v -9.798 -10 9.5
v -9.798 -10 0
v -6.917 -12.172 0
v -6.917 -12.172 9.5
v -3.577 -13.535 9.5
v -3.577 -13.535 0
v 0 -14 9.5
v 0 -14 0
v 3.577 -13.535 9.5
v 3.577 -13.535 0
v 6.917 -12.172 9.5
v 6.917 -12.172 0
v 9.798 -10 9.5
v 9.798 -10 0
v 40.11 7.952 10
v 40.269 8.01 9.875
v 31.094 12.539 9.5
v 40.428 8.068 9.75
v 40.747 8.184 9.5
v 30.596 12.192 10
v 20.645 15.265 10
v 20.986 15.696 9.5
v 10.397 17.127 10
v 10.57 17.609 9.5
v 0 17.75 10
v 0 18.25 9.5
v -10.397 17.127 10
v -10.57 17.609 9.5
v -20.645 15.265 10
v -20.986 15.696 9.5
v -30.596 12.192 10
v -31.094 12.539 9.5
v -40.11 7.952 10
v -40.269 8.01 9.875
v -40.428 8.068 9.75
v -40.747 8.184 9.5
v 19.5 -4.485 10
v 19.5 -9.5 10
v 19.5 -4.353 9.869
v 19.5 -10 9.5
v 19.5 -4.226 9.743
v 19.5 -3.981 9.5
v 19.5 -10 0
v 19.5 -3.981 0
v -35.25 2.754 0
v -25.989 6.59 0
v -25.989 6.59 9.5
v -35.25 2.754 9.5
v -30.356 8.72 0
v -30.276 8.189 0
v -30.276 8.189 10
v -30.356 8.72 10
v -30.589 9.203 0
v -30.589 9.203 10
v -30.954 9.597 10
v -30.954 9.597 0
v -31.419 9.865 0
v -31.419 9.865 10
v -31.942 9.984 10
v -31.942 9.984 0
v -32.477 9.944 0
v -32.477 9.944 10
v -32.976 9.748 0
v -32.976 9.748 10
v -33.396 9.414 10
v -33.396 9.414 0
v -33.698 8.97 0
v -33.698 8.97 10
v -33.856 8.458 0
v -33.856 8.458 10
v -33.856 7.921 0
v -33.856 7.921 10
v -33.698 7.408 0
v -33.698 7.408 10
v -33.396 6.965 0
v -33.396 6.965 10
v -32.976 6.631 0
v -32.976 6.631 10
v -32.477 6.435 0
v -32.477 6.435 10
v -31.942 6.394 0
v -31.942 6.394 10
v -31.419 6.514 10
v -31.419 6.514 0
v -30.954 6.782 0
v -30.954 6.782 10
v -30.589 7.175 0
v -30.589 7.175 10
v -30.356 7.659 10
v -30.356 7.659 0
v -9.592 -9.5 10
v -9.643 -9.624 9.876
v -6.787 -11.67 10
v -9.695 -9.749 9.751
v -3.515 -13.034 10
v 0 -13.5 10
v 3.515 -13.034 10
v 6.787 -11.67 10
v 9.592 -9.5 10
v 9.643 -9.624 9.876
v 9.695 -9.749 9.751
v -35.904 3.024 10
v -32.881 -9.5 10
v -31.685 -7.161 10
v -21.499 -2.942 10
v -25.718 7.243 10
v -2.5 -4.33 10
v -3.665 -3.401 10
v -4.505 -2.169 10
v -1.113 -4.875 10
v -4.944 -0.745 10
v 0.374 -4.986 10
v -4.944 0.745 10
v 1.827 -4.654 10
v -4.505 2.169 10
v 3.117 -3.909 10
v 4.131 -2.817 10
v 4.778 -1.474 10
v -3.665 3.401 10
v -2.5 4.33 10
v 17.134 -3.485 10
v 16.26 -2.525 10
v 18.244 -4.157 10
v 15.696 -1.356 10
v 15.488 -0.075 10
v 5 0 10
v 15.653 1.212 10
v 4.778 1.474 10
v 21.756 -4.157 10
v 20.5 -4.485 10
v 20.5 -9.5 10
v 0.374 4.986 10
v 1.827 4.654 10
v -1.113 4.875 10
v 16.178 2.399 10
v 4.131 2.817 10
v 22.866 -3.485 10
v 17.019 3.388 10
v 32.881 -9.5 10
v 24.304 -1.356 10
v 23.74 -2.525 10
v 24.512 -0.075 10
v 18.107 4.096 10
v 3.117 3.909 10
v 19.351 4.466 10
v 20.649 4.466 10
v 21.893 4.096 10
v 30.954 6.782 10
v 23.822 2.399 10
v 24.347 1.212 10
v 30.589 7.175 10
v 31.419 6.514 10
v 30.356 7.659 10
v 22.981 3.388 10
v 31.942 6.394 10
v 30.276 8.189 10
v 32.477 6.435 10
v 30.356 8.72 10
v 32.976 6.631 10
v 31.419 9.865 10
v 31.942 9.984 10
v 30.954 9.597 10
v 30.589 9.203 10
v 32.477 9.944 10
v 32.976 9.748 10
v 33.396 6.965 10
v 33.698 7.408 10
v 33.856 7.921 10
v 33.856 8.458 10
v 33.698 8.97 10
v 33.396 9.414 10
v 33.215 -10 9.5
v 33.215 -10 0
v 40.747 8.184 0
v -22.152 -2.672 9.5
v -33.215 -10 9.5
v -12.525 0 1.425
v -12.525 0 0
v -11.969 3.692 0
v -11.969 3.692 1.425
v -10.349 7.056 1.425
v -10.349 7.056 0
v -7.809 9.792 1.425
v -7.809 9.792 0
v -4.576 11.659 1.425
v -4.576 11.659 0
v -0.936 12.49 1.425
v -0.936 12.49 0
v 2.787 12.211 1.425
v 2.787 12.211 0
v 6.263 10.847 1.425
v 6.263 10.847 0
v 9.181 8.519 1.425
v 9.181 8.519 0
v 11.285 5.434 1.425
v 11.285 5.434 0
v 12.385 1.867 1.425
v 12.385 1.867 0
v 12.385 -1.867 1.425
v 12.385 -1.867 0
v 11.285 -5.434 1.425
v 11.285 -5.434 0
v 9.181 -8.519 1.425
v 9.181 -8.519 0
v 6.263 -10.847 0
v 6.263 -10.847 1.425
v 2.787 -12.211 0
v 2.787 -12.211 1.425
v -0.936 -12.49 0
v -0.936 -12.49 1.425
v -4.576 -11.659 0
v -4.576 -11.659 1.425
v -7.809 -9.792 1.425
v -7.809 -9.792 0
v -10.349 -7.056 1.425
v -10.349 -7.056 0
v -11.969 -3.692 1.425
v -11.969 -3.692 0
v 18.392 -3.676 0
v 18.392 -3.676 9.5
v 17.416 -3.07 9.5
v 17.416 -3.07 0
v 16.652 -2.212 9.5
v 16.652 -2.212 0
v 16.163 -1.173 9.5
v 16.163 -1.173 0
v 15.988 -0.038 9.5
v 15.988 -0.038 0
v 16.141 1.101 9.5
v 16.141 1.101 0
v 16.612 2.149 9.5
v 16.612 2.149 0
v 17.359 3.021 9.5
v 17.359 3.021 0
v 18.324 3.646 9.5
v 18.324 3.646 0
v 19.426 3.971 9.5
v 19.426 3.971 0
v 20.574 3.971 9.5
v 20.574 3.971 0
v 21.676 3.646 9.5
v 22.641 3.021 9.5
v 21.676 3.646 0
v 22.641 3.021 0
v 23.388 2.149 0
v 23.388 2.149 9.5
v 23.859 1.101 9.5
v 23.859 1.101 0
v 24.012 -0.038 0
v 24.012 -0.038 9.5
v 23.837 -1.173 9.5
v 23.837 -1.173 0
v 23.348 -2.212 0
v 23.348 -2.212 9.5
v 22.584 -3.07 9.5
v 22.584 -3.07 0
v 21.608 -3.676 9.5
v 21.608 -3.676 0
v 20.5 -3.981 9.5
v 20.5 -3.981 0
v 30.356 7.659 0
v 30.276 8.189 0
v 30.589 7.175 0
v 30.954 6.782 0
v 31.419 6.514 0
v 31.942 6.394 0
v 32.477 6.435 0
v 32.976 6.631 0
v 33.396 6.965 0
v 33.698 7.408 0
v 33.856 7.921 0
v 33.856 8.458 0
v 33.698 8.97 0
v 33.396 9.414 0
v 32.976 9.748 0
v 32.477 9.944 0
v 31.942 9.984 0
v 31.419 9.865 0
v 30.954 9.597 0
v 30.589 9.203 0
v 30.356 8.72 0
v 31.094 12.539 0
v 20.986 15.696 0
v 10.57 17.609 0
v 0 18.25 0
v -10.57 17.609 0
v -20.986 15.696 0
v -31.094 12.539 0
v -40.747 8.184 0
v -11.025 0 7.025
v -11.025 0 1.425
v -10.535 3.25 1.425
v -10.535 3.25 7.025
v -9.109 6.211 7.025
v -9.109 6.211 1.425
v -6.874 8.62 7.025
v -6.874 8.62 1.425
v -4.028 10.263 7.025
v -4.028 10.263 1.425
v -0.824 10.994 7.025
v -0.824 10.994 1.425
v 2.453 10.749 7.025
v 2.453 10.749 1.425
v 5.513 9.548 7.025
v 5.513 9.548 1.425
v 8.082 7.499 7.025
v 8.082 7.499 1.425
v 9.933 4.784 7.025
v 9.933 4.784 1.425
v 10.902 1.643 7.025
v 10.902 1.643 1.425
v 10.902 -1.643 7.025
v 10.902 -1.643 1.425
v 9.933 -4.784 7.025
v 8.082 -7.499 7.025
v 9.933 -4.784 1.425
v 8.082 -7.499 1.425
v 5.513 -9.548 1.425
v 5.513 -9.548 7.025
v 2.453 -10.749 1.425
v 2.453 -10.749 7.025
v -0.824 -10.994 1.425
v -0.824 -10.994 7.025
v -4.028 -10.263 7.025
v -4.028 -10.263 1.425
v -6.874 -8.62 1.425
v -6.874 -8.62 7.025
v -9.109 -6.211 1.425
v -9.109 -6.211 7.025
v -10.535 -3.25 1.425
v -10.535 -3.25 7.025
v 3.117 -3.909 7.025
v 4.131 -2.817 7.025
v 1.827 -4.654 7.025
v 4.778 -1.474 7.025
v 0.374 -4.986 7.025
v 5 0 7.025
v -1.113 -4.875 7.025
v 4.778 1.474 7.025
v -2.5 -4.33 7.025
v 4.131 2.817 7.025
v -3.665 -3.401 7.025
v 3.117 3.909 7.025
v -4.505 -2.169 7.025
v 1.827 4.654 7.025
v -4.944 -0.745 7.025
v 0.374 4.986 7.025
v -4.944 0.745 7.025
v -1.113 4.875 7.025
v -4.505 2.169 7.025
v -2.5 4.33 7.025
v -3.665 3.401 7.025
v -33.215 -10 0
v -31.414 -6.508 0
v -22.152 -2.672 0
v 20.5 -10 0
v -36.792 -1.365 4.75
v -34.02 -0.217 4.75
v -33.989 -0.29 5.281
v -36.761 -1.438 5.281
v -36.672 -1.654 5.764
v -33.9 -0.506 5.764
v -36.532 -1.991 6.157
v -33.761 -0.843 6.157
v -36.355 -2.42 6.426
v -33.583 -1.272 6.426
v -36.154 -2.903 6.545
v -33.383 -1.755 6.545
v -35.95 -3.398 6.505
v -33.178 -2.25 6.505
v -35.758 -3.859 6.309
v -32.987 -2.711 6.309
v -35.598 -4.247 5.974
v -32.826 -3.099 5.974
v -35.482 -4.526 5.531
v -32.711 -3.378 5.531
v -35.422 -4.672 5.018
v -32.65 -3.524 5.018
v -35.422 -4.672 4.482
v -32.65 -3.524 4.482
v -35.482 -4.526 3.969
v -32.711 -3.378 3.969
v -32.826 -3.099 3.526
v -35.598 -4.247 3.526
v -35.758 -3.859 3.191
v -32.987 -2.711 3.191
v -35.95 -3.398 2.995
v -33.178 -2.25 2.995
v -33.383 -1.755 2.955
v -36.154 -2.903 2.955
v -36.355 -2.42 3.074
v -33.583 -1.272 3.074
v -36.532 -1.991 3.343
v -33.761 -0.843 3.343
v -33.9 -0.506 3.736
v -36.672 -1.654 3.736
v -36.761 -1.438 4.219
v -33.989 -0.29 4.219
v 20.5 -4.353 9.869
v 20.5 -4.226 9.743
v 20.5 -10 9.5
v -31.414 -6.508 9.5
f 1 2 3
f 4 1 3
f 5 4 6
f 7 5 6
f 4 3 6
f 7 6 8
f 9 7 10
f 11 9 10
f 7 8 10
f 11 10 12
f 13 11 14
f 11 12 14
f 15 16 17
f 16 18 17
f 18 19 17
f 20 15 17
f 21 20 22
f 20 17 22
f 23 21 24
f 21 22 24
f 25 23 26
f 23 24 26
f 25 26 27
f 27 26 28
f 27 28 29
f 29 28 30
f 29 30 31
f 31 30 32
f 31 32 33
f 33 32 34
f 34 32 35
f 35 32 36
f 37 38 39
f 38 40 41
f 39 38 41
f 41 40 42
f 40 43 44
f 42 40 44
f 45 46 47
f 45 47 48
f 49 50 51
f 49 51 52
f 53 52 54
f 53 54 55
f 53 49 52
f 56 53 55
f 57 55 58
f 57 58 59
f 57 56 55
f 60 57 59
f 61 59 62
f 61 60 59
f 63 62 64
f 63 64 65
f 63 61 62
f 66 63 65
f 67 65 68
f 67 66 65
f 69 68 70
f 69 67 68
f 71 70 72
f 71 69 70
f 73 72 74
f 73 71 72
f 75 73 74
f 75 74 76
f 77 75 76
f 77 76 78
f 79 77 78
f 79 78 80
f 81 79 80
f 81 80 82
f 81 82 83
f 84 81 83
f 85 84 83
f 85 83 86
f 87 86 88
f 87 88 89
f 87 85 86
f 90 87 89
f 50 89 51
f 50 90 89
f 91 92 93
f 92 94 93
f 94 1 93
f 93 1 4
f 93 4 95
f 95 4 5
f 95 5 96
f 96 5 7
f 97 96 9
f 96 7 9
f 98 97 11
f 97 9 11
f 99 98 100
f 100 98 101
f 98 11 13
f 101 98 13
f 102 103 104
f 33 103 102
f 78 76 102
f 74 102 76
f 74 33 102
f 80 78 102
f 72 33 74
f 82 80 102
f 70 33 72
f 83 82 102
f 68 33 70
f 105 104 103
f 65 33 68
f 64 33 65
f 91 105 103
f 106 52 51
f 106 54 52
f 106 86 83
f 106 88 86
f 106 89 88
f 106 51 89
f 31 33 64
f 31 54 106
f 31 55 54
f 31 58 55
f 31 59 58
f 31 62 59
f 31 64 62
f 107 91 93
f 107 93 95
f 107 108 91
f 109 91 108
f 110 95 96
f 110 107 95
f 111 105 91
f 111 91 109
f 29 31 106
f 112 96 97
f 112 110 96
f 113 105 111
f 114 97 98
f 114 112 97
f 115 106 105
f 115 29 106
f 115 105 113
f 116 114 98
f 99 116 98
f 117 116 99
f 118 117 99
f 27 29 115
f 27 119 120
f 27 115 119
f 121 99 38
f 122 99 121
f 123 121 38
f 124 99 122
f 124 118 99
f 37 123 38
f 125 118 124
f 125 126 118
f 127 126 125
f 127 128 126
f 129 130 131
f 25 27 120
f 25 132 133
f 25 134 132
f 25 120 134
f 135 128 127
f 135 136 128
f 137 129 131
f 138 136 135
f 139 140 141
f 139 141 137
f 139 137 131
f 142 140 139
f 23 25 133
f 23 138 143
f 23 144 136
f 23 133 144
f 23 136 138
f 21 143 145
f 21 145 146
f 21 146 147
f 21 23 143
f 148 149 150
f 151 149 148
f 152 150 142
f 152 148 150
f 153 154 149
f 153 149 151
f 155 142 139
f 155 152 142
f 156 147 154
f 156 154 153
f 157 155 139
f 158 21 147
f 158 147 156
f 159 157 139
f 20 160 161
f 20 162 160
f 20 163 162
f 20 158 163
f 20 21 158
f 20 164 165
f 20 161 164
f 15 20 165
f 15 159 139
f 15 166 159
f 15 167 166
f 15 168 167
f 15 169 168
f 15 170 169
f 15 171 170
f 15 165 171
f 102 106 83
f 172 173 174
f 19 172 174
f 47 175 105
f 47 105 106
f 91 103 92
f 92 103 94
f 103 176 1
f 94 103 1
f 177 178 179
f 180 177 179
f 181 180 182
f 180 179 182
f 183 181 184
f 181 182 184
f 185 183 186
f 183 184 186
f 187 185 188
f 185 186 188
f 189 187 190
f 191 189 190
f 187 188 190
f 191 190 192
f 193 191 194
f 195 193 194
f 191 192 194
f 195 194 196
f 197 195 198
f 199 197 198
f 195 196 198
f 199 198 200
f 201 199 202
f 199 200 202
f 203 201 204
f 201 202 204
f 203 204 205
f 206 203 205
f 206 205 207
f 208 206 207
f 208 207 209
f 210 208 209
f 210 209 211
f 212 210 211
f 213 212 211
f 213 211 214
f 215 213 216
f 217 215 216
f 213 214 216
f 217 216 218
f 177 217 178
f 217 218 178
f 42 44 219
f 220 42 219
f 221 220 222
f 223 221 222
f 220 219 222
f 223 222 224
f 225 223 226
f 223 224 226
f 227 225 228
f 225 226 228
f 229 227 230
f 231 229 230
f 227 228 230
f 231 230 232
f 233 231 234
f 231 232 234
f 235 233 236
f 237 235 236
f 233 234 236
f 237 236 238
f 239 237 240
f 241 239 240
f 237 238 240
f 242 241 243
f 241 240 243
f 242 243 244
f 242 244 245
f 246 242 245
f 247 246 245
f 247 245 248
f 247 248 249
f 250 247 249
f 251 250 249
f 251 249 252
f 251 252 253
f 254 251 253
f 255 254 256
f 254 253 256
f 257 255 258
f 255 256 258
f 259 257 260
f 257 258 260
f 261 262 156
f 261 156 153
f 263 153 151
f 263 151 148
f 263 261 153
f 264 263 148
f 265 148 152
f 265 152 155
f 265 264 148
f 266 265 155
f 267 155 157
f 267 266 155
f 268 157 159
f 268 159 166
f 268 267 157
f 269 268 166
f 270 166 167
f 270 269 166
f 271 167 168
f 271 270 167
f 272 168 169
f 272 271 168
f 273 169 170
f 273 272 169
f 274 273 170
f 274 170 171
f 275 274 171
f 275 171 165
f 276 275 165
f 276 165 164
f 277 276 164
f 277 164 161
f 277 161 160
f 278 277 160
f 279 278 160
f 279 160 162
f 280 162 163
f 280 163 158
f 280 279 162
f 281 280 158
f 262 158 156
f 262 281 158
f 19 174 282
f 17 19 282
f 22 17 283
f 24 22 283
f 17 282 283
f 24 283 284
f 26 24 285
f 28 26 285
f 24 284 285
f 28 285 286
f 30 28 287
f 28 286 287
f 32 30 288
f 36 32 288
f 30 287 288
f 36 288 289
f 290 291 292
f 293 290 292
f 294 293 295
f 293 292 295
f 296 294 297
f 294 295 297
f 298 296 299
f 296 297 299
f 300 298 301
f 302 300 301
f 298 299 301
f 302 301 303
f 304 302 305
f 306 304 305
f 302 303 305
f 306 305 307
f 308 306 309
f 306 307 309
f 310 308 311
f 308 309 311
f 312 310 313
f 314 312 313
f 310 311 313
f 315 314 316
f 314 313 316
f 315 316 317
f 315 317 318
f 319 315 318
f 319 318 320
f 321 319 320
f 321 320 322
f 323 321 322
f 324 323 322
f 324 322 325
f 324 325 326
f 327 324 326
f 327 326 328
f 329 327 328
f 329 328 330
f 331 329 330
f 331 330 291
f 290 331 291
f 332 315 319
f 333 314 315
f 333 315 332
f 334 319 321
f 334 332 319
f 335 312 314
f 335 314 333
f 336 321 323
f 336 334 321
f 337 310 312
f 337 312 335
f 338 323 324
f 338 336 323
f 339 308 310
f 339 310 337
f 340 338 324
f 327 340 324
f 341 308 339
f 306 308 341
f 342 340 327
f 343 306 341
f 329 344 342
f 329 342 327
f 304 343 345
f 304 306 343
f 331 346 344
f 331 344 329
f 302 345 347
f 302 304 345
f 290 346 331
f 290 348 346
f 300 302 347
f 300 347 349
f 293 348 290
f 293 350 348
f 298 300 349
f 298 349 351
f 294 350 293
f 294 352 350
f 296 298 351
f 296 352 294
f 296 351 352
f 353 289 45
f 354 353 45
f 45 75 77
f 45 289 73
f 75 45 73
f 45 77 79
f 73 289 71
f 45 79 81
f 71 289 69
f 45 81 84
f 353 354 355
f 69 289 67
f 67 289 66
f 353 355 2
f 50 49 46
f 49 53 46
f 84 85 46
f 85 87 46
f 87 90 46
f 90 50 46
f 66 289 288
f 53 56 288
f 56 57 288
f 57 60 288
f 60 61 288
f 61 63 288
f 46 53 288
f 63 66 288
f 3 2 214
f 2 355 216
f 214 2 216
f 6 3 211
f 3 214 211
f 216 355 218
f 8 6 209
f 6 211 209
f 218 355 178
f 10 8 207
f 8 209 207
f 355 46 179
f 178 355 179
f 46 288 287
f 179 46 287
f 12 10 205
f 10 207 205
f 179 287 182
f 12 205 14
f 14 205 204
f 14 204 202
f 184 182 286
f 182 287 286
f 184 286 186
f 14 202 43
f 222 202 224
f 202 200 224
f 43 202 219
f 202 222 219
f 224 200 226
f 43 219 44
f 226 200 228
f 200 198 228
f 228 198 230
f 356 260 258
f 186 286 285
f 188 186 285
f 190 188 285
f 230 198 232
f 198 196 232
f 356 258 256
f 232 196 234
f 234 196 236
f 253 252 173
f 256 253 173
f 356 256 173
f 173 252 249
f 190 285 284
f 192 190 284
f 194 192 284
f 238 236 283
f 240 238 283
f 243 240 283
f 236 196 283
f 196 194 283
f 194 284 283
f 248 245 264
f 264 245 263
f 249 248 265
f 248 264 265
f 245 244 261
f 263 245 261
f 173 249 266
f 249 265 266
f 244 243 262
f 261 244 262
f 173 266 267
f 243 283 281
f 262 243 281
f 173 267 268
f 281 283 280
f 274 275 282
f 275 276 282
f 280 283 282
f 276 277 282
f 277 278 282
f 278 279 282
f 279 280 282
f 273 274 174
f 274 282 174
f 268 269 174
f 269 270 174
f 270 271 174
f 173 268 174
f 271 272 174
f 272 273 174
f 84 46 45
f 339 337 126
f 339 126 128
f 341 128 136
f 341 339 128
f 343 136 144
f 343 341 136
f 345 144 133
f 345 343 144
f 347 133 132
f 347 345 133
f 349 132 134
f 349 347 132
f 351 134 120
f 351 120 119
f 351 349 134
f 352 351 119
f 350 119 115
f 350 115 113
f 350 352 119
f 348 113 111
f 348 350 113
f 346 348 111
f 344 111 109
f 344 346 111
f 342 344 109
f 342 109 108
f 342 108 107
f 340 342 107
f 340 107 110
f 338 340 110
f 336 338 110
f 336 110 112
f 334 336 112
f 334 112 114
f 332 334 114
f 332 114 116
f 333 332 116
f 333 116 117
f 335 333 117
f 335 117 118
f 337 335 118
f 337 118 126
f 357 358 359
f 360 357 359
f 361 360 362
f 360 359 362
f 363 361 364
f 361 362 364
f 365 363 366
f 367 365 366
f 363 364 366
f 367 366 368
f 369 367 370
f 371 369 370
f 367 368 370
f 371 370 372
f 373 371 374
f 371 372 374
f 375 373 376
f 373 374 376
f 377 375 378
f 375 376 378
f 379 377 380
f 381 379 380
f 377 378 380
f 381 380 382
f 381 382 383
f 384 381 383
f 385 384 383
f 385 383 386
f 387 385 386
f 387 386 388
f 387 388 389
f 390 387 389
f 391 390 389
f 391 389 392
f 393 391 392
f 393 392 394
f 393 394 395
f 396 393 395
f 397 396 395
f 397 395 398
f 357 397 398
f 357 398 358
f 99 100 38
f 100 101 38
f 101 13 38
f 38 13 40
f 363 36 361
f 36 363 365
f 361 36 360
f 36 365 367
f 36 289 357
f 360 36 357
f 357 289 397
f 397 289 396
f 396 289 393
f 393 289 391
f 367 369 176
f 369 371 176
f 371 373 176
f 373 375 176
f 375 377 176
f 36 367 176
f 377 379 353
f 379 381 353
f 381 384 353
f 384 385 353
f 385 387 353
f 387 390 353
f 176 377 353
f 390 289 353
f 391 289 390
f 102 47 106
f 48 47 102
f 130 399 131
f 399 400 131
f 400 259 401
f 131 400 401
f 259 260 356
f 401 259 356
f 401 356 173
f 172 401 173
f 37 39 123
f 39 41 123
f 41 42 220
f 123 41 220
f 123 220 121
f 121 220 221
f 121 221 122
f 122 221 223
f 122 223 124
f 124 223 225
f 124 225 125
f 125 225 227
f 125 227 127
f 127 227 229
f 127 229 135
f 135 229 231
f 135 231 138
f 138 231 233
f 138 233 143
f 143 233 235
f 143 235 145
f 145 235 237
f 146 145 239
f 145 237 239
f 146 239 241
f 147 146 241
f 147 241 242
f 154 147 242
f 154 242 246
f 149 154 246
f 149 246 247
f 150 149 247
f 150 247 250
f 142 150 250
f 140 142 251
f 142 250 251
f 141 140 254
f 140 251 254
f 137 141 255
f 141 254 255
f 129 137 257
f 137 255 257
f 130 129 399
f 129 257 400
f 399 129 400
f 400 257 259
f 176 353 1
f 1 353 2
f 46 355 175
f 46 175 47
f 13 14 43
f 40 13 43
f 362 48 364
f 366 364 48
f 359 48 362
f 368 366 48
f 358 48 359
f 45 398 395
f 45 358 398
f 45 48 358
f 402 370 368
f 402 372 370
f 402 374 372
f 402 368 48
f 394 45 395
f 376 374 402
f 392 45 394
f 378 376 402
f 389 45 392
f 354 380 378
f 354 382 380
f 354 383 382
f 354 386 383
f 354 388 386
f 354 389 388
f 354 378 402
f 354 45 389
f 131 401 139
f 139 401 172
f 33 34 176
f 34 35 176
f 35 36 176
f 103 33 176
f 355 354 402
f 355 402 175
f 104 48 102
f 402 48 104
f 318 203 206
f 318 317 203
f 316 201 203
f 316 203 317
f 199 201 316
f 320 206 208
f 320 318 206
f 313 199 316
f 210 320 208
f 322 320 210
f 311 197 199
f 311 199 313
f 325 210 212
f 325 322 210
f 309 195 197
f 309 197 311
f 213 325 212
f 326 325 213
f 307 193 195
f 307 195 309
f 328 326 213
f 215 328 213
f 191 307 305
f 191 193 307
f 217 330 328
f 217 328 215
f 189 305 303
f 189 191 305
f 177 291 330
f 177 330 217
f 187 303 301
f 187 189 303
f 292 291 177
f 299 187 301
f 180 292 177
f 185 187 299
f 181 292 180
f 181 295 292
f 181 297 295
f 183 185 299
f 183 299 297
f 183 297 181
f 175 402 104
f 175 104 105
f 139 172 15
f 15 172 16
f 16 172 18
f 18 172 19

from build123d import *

# Parameters (mm, degrees)
SKETCH1_R           = 5
SKETCH1_R_2         = 1.8
BOSS_EXTRUDE1_DEPTH = 10
SKETCH3_R           = 11.025
CUT_EXTRUDE2_DEPTH  = 7.025
SKETCH4_R           = 12.525
CUT_EXTRUDE3_DEPTH  = 1.425
CHAMFER1_SIZE       = 0.5
SKETCH5_R           = 1.8
CUT_EXTRUDE4_DEPTH  = 10
CHAMFER2_SIZE       = 0.5


with BuildPart() as part:
    # Sketch1 → Boss-Extrude1 (new body)
    with BuildSketch(Plane.XY):
        with BuildLine():
            Line((-40.746699048, 8.183561953), (-33.214821075, -10))
            Line((-33.214821075, -10), (-9.797958971, -10))
            ThreePointArc((-9.797958971, -10), (0, -14), (9.797958971, -10))
            Line((9.797958971, -10), (19.5, -10))
            Line((19.5, -10), (19.5, -3.981225471))
            ThreePointArc((19.5, -3.981225471), (20, 4.0125), (20.5, -3.981225471))
            Line((20.5, -3.981225471), (20.5, -10))
            Line((20.5, -10), (33.214821075, -10))
            Line((33.214821075, -10), (40.746699048, 8.183561953))
            ThreePointArc((40.746699048, 8.183561953), (0, 18.25), (-40.746699048, 8.183561953))
        make_face()
        Circle(SKETCH1_R, mode=Mode.SUBTRACT)
        with Locations((-32.07645249, 8.189406634)):
            Circle(SKETCH1_R_2, mode=Mode.SUBTRACT)
        with Locations(Location((32.07645249, 8.189406634, 0), (0, 0, 180))):
            Circle(SKETCH1_R_2, mode=Mode.SUBTRACT)
        Polygon((-25.988511975, 6.5901118), (-35.250404289, 2.75371039), (-31.414002879, -6.508181923), (-22.152110566, -2.671780514), align=None, mode=Mode.SUBTRACT)
    extrude(amount=BOSS_EXTRUDE1_DEPTH)

    # Sketch3 → Cut-Extrude2 (cut)
    with BuildSketch(Plane(origin=(0, 0, 0), x_dir=(-1, 0, 0), z_dir=(0, 0, -1))):
        Circle(SKETCH3_R)
    extrude(amount=-CUT_EXTRUDE2_DEPTH, mode=Mode.SUBTRACT)

    # Sketch4 → Cut-Extrude3 (cut)
    with BuildSketch(Plane(origin=(0, 0, 0), x_dir=(-1, 0, 0), z_dir=(0, 0, -1))):
        Circle(SKETCH4_R)
    extrude(amount=-CUT_EXTRUDE3_DEPTH, mode=Mode.SUBTRACT)

    # Chamfer1
    chamfer1_edges = [part.edges().sort_by_distance(p)[0] for p in [
        (20, 4.0125, 10),
        (-24.070311271, 1.959165643, 10),
        (-30.619458132, 4.671911095, 10),
        (-33.332203584, -1.877235766, 10),
        (-26.783056723, -4.589981218, 10),
    ]]
    chamfer(chamfer1_edges, length=CHAMFER1_SIZE)

    # Sketch5 → Cut-Extrude4 (cut)
    with BuildSketch(Plane(origin=(-29.114518455, -12.059628406, 0), x_dir=(0, 0, -1), z_dir=(0.923879532511288, 0.3826834323650871, 0))):
        with Locations(Location((-4.75, 11.018842374, 0), (0, 0, 90))):
            Circle(SKETCH5_R)
    extrude(amount=-CUT_EXTRUDE4_DEPTH, mode=Mode.SUBTRACT)

    # Chamfer2
    chamfer2_edges = [part.edges().sort_by_distance(p)[0] for p in [
        (-36.980760062, -0.908219024, 10),
        (-21.506390023, -10, 10),
        (0, -14, 10),
        (14.648979486, -10, 10),
        (26.857410538, -10, 10),
        (36.980760062, -0.908219024, 10),
        (0, 18.25, 10),
    ]]
    chamfer(chamfer2_edges, length=CHAMFER2_SIZE)


solid = part.part
